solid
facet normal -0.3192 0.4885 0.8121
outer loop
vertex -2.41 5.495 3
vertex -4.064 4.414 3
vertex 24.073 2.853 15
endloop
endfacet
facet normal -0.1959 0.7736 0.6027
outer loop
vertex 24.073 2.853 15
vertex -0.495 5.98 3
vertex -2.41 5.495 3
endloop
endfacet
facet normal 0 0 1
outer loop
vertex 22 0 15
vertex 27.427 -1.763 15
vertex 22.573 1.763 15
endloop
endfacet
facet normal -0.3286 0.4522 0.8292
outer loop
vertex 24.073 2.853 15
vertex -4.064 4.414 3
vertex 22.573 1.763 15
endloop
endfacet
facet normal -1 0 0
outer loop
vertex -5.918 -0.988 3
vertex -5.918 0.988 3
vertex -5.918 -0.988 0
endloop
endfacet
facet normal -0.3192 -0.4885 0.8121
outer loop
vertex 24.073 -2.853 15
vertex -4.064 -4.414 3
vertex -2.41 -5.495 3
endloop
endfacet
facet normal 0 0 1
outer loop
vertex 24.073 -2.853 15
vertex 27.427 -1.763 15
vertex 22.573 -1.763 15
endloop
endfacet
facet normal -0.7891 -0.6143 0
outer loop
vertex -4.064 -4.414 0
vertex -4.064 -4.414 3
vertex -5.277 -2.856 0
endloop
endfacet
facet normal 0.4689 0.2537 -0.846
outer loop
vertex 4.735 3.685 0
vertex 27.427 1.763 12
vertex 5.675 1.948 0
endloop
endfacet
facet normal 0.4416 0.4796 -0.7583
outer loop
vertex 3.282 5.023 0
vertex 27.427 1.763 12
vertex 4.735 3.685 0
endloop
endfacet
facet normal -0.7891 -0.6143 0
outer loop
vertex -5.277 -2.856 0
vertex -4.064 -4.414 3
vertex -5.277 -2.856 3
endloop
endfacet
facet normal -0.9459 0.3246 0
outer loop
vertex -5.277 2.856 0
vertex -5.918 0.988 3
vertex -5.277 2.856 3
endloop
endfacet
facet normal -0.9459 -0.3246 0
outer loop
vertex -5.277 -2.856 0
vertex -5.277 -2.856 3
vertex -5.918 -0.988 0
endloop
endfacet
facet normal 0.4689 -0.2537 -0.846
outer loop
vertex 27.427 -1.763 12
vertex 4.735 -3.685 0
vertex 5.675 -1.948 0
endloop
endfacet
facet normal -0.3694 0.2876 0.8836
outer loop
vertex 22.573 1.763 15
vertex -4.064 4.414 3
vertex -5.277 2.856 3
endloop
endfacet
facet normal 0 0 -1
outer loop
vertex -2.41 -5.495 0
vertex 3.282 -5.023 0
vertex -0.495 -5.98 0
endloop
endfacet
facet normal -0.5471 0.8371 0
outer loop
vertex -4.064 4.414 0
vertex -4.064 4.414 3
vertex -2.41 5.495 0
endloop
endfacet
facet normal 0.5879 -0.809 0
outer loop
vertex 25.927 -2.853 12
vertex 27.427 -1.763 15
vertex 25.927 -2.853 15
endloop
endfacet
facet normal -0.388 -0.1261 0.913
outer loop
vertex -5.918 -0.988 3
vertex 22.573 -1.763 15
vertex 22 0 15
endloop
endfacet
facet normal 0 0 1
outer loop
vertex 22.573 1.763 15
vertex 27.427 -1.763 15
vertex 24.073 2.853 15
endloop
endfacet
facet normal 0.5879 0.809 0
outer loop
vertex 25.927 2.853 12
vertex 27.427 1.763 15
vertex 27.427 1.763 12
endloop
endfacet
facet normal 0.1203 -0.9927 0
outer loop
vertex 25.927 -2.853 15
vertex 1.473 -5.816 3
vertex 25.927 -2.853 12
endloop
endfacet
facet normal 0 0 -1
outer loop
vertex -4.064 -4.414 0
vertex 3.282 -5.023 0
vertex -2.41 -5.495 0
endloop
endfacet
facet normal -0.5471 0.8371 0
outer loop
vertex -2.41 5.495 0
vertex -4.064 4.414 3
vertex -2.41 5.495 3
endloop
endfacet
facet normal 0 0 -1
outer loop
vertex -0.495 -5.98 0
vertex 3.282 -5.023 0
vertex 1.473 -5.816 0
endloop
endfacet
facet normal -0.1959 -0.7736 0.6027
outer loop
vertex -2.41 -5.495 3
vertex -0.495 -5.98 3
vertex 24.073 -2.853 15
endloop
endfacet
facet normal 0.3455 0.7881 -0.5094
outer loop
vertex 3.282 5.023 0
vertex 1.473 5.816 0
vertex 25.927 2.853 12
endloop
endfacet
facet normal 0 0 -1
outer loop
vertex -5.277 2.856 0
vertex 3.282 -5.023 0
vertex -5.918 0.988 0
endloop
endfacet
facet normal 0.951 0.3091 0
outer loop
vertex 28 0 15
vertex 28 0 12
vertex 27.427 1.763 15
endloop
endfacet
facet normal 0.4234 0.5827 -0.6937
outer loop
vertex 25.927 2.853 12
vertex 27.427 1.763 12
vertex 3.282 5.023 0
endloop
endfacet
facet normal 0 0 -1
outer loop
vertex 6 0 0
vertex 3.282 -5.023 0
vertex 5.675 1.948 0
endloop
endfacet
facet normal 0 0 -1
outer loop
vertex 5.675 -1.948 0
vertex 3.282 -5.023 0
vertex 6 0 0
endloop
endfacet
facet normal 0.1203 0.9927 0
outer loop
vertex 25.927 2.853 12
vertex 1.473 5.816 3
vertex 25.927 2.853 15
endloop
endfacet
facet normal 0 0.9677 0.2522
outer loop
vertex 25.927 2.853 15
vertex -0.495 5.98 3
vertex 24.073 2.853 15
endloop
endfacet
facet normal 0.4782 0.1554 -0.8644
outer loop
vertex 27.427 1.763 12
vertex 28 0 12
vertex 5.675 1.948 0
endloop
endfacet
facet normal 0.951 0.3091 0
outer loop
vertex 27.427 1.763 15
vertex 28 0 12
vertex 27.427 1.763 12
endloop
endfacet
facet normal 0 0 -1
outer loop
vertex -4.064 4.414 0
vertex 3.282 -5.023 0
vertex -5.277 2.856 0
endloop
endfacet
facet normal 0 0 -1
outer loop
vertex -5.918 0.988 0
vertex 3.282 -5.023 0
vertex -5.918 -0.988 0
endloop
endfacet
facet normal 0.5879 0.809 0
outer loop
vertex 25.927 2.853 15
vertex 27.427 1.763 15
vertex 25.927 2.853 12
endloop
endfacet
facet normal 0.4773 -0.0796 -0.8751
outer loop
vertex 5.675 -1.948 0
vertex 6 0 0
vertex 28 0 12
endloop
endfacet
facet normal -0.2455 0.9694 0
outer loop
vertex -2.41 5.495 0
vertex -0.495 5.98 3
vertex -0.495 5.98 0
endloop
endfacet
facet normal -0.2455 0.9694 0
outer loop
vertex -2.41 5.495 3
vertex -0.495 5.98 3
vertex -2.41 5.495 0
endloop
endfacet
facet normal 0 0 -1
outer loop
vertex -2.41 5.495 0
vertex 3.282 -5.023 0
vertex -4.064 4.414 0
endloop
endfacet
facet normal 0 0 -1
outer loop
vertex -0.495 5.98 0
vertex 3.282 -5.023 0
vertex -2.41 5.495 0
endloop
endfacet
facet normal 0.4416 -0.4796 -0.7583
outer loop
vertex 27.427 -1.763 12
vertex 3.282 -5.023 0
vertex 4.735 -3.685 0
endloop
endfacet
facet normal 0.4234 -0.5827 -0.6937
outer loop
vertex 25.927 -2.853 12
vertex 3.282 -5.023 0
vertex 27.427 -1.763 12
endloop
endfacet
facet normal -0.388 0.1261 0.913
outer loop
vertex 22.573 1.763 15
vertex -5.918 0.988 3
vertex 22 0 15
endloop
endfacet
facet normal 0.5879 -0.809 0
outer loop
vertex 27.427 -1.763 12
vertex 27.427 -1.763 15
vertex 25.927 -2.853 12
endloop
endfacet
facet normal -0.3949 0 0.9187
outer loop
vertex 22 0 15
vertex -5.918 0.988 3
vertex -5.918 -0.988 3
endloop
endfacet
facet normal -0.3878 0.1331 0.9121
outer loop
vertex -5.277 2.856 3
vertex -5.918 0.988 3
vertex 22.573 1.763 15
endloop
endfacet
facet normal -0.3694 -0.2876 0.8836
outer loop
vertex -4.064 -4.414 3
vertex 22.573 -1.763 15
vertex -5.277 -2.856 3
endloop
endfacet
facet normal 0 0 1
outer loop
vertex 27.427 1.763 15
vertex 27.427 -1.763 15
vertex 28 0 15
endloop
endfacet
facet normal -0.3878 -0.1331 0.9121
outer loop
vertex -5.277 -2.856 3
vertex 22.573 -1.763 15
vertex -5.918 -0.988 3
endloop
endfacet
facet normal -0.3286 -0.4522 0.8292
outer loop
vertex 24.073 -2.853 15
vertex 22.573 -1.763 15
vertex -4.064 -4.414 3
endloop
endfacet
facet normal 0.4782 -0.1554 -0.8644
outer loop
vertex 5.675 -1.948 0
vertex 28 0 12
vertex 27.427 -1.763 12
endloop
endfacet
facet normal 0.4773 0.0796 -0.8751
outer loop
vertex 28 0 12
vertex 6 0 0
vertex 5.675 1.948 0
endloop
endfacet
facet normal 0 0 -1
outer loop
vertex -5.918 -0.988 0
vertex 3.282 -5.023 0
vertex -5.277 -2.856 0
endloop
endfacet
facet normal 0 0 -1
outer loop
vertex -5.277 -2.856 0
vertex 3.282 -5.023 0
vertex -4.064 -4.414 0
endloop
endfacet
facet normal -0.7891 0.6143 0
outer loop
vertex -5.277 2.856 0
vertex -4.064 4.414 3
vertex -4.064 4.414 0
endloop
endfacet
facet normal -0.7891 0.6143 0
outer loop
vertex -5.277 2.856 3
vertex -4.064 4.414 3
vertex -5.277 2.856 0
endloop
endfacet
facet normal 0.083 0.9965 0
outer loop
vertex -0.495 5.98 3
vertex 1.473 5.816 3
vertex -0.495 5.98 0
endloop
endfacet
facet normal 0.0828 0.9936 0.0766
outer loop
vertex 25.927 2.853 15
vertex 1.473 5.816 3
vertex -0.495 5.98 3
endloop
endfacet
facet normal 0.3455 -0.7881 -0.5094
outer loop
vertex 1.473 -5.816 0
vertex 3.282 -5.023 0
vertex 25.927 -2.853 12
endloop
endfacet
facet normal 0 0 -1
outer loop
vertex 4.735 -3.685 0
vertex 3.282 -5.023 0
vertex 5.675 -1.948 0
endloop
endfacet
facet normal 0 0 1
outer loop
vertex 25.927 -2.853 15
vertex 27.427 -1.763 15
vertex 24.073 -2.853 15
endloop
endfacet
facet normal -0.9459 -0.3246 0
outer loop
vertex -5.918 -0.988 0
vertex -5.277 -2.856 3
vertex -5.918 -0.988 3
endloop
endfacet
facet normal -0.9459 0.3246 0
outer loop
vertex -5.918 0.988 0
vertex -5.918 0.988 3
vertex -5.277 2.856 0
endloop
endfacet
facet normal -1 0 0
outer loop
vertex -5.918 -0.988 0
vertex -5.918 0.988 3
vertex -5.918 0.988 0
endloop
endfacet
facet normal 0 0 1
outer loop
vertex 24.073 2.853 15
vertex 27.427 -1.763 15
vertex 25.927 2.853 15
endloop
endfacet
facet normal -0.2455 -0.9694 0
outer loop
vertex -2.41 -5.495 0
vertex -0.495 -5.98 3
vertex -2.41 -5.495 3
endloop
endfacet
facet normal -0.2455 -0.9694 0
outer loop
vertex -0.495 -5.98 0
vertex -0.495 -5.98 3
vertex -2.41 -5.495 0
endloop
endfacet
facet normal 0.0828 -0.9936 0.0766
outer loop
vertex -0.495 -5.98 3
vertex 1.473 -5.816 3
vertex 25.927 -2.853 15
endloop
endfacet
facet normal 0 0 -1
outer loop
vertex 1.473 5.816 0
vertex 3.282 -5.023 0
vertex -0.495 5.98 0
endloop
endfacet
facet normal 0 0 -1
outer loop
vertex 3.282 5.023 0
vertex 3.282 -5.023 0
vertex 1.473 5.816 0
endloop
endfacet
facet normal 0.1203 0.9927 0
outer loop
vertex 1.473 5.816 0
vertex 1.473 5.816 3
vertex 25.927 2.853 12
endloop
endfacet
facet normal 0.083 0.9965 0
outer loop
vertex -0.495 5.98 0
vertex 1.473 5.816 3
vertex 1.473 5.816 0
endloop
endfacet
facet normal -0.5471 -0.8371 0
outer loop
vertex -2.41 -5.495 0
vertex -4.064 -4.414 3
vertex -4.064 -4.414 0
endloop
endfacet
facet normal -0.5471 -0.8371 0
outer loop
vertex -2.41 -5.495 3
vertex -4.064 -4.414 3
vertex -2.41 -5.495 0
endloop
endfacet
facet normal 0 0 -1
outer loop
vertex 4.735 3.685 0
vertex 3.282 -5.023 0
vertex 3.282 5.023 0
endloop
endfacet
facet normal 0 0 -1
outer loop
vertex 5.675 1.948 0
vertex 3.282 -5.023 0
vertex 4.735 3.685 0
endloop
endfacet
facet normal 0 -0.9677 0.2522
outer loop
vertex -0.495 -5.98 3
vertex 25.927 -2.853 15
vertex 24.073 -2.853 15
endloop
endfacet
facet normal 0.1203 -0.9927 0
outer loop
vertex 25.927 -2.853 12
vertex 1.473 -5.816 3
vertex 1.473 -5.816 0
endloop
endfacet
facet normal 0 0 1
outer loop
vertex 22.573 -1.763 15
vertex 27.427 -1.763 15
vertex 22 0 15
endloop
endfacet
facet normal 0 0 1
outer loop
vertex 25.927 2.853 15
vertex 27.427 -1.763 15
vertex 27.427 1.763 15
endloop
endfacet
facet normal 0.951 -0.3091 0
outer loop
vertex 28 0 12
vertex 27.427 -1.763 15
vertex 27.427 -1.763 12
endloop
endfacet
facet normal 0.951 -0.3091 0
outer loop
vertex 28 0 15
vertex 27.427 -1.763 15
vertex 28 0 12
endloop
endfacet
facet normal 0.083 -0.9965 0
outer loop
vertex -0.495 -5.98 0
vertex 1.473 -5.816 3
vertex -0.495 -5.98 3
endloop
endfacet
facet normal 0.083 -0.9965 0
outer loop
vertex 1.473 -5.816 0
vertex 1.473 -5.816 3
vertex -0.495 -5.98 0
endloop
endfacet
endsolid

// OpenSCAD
// case 05: parallel cylinders at different heights and radii, not coaxial.
hull() { cylinder(r = 6, h = 3); translate([25, 0, 12]) cylinder(r = 3, h = 3); }
